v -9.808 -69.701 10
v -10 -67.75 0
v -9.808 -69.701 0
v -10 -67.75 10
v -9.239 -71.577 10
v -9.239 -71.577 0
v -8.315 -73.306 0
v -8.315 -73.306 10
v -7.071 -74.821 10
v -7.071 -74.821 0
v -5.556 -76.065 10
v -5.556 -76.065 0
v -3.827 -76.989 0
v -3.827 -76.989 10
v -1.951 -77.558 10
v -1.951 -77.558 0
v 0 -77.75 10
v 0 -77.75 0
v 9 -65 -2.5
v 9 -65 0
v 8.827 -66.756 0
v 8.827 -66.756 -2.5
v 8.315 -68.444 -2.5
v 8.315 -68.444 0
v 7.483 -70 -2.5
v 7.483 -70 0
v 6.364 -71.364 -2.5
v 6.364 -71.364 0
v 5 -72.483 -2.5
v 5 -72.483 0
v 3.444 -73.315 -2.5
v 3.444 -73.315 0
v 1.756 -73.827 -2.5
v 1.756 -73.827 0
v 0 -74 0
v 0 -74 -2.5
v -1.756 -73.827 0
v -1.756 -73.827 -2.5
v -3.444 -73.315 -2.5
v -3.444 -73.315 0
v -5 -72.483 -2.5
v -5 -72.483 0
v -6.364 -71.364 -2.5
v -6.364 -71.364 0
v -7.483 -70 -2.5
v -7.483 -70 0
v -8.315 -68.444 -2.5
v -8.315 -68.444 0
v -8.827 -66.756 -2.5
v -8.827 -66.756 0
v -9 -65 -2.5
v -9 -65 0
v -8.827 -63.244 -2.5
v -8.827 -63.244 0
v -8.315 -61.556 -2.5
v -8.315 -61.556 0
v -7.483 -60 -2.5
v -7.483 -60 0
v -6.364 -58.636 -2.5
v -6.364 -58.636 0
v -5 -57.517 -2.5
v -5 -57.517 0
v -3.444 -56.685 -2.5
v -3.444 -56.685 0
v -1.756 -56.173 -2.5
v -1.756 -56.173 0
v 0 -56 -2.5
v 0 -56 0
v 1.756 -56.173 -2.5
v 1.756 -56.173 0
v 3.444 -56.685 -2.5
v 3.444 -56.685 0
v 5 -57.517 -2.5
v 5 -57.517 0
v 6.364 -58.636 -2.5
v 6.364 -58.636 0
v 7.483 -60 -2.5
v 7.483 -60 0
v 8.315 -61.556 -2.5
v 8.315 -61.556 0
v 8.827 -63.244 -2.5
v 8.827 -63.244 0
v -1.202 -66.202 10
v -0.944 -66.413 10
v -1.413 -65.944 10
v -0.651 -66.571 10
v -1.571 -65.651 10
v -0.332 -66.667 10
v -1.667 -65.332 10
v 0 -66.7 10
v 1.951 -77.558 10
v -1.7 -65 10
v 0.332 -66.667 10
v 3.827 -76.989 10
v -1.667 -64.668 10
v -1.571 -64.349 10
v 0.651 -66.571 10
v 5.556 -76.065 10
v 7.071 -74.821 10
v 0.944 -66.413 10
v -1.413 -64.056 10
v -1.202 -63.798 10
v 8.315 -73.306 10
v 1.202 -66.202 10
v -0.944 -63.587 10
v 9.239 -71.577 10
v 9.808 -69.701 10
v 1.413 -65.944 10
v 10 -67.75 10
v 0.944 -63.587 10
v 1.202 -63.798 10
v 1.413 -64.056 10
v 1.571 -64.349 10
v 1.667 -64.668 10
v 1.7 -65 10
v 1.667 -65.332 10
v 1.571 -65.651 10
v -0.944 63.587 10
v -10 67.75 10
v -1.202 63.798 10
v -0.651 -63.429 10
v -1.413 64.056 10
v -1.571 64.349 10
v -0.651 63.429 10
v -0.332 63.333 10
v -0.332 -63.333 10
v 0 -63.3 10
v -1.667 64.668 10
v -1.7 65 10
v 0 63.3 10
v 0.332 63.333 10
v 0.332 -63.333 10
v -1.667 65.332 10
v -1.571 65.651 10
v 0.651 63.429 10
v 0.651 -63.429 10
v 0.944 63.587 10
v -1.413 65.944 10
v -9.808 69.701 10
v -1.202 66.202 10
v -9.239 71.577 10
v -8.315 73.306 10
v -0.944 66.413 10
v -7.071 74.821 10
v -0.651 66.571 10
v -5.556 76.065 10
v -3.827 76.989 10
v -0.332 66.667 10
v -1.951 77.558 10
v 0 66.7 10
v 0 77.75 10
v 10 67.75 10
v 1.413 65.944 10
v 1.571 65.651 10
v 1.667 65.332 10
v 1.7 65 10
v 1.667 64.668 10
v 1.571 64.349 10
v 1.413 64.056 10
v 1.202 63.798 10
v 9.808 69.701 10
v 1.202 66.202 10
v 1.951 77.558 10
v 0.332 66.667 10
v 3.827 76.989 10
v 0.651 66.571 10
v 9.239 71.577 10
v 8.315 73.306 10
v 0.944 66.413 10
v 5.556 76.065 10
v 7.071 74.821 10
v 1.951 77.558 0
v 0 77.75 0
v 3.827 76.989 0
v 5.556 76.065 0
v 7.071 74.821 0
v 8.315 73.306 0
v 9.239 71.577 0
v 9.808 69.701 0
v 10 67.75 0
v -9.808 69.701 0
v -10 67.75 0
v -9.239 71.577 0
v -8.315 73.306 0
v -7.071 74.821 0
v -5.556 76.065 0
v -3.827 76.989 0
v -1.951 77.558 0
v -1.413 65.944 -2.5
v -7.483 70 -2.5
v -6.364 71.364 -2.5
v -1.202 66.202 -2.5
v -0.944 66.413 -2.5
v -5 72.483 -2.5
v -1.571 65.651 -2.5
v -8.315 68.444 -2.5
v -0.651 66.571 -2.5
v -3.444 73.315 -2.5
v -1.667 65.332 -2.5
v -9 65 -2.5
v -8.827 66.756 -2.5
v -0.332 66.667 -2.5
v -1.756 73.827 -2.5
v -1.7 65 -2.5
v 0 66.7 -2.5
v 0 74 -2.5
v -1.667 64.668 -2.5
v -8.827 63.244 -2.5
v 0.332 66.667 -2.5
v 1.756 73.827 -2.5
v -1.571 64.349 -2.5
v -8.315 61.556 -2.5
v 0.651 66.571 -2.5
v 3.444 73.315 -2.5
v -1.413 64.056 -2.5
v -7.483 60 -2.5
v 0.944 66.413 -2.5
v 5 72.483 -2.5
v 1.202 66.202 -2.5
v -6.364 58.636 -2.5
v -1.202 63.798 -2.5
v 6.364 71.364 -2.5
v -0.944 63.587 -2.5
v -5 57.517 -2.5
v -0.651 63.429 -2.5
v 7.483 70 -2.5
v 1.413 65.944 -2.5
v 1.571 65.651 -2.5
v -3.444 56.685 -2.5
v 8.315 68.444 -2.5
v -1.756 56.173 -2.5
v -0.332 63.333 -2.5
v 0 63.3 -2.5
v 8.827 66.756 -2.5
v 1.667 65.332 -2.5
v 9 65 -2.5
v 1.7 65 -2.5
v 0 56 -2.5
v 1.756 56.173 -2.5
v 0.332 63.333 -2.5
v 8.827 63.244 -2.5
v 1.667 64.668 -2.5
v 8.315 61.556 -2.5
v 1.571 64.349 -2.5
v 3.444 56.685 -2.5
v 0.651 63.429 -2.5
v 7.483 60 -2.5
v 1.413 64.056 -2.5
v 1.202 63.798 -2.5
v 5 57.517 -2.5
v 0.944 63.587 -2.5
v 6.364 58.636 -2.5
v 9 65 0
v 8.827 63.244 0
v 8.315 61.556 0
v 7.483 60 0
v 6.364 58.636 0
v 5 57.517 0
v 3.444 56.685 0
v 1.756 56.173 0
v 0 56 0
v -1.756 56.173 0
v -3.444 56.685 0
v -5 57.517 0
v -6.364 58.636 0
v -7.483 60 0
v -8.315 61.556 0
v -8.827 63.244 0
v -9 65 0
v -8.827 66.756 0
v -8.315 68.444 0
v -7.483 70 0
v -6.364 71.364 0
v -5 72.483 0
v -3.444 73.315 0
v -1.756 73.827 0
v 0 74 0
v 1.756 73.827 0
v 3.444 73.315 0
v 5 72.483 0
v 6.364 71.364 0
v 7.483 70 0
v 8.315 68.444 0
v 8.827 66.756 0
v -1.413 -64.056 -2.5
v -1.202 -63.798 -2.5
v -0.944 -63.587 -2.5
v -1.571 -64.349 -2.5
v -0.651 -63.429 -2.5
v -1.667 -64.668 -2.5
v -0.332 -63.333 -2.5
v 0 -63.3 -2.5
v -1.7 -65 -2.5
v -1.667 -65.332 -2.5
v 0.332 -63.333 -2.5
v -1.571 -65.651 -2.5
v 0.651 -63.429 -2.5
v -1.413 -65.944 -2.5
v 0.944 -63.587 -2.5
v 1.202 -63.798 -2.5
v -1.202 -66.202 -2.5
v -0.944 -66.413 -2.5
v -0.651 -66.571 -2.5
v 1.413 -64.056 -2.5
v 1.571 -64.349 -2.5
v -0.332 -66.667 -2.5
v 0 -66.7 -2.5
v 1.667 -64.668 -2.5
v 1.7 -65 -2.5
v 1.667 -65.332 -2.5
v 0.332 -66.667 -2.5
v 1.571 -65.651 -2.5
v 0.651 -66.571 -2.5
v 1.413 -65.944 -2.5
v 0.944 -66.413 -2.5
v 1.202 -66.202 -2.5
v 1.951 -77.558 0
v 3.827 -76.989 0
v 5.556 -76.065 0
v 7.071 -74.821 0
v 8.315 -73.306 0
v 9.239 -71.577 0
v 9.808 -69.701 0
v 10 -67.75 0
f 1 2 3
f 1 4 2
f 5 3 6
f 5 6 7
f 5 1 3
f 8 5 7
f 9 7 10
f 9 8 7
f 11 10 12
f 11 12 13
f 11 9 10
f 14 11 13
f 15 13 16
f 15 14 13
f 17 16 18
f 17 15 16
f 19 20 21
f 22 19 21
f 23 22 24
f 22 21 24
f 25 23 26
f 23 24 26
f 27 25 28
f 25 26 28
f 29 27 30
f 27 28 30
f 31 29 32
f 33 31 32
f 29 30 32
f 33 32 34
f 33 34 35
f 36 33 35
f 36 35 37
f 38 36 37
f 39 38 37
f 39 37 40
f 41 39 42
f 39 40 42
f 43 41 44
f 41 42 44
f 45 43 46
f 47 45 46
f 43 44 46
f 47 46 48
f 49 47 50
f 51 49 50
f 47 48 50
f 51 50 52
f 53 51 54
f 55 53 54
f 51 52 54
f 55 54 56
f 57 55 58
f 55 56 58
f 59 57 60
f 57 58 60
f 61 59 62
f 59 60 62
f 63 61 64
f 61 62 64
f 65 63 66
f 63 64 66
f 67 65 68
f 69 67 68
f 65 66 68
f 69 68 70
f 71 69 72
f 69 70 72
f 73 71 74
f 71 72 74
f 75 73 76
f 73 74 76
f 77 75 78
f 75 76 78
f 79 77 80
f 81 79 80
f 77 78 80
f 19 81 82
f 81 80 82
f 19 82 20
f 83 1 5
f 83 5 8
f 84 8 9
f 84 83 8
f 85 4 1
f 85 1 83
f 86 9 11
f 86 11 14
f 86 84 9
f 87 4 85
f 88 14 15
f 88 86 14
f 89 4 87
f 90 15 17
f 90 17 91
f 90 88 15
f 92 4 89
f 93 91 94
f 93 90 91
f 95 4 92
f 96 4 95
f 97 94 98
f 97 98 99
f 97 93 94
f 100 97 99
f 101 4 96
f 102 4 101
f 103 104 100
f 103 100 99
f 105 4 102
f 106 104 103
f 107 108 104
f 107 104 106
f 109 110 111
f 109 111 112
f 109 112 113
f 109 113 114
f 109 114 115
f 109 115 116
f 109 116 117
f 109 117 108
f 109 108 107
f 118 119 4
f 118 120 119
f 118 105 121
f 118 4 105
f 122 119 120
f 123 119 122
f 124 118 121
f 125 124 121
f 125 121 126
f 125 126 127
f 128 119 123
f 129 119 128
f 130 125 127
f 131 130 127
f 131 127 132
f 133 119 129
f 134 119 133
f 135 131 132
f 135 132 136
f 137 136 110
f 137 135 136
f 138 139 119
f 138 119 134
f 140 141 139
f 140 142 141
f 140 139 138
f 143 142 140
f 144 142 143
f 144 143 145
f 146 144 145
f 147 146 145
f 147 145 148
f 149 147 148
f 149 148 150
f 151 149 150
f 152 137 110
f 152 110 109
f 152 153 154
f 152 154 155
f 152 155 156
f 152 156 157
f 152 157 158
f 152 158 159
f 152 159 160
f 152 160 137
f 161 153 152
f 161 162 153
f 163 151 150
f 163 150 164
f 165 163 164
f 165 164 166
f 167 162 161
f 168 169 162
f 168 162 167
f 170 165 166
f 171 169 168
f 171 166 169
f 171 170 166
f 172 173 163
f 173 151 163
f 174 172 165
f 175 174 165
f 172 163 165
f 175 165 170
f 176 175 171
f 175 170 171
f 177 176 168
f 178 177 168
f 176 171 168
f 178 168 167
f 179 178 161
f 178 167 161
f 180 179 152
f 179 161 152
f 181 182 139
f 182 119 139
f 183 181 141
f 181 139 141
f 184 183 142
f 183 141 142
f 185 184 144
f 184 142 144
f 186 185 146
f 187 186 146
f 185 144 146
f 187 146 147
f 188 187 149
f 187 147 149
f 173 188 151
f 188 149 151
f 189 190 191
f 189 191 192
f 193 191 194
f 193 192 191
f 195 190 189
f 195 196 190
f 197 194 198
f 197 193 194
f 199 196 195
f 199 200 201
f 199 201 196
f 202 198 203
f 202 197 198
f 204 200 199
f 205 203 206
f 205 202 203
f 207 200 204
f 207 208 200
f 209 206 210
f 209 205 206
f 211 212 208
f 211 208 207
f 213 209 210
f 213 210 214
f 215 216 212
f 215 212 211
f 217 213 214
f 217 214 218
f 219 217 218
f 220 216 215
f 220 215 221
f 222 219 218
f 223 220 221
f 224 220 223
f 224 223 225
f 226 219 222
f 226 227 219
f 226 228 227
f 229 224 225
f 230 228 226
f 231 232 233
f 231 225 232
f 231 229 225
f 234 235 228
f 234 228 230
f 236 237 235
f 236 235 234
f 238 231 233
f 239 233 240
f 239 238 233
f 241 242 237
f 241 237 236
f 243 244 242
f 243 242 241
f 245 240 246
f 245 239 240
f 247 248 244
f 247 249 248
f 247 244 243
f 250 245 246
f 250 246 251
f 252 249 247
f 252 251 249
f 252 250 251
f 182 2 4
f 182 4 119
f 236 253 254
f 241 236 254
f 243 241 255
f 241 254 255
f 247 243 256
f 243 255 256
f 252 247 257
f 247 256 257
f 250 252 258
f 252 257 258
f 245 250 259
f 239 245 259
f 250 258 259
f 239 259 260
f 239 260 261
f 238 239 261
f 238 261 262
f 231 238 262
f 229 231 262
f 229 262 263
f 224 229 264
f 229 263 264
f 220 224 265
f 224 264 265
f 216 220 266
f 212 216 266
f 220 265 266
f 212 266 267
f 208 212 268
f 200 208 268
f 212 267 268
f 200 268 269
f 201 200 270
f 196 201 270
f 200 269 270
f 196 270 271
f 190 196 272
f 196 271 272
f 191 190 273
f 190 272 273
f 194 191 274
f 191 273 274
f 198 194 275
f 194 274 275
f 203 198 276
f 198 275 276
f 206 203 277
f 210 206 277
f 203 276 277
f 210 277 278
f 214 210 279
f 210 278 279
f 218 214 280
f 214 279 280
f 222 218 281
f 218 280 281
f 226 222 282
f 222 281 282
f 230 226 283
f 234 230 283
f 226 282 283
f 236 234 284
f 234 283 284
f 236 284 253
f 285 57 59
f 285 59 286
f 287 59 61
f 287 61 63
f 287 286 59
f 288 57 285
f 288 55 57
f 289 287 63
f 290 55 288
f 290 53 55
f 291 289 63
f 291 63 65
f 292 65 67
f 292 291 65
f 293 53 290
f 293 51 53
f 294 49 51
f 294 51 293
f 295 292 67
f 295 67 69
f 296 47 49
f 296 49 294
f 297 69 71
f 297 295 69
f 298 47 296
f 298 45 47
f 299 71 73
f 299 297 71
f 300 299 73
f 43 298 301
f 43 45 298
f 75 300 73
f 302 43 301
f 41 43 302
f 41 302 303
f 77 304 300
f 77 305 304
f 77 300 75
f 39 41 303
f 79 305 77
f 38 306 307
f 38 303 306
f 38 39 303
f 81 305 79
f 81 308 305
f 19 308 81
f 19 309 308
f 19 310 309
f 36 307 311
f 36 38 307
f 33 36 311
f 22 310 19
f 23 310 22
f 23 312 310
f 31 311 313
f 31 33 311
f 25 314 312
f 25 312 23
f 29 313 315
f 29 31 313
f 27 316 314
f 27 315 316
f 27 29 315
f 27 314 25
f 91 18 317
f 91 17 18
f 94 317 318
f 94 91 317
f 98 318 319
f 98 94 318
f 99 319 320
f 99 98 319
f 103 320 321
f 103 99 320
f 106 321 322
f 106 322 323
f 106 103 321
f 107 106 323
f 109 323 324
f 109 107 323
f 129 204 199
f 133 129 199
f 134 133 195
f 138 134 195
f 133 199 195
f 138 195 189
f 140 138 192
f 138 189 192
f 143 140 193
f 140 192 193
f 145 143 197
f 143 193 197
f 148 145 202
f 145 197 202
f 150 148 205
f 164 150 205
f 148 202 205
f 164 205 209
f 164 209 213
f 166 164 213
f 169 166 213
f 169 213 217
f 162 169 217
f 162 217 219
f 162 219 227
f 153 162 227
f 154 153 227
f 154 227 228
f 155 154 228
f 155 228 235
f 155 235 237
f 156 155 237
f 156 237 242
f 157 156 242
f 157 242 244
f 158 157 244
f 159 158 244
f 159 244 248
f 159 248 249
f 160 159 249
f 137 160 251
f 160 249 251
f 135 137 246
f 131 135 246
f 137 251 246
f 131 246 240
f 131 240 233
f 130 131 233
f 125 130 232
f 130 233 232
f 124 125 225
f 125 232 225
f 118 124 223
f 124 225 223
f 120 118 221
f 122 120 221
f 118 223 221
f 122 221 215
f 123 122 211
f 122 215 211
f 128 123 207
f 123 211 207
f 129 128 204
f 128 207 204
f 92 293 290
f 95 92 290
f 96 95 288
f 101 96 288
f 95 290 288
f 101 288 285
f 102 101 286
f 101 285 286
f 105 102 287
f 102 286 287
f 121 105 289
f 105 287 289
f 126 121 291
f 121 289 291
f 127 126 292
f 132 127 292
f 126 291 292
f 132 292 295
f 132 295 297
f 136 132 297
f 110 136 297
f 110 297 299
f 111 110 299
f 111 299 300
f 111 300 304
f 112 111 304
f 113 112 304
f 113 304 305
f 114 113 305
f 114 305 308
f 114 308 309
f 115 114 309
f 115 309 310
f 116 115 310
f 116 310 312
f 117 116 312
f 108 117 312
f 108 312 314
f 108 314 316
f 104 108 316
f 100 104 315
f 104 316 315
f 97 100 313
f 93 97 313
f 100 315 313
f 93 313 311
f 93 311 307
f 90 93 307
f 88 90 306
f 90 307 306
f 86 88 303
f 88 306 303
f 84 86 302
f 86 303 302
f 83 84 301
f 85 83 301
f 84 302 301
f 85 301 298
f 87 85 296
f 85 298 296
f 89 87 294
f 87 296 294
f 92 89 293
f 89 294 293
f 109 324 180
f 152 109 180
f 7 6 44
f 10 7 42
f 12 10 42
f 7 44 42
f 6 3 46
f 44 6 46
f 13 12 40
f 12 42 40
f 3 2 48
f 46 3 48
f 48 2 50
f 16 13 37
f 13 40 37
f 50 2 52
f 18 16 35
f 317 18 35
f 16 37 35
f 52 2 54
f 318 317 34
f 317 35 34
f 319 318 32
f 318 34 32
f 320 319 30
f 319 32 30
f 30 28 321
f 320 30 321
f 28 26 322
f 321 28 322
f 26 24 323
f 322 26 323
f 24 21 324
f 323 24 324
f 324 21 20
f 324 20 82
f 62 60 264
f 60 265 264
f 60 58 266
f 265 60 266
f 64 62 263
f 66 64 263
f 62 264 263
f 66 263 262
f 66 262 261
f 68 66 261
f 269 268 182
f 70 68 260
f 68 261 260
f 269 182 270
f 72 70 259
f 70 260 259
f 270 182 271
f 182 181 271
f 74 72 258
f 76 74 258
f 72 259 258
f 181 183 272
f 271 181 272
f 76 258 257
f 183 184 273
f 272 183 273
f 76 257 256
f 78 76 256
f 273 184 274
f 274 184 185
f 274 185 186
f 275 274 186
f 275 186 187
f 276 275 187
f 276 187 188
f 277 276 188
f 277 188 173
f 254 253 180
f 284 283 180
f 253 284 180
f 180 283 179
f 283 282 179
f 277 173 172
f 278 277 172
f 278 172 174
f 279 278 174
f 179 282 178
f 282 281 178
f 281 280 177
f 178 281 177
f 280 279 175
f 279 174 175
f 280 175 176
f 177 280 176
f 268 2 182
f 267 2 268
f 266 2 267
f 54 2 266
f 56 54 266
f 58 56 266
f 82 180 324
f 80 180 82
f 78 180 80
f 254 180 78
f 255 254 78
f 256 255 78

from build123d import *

# Parameters (mm, degrees)
SKETCH1_W           = 20
SKETCH1_H           = 155.5
BOSS_EXTRUDE1_DEPTH = 10
SKETCH2_R           = 9
BOSS_EXTRUDE2_DEPTH = 2.5
SKETCH3_R           = 1.7
CUT_EXTRUDE1_DEPTH  = 80.380806874
FILLET1_R           = 10


with BuildPart() as part:
    # Sketch1 → Boss-Extrude1 (new body)
    with BuildSketch(Plane.XY):
        Rectangle(SKETCH1_W, SKETCH1_H)
    extrude(amount=BOSS_EXTRUDE1_DEPTH)

    # Sketch2 → Boss-Extrude2 (add)
    with BuildSketch(Plane(origin=(0, 0, 0), x_dir=(-1, 0, 0), z_dir=(0, 0, -1))):
        with Locations(Location((0, 65, 0), (0, 0, 180))):
            Circle(SKETCH2_R)
        with Locations(Location((0, -65, 0), (0, 0, 180))):
            Circle(SKETCH2_R)
    extrude(amount=BOSS_EXTRUDE2_DEPTH)

    # Sketch3 → Cut-Extrude1 (cut, through all)
    with BuildSketch(Plane(origin=(0, 0, -2.5), x_dir=(-1, 0, 0), z_dir=(0, 0, -1))):
        with Locations((0, 65)):
            Circle(SKETCH3_R)
        with Locations((0, -65)):
            Circle(SKETCH3_R)
    extrude(amount=-CUT_EXTRUDE1_DEPTH, mode=Mode.SUBTRACT)

    # Fillet1
    fillet1_edges = [part.edges().sort_by_distance(p)[0] for p in [
        (10, -77.75, 5),
        (-10, -77.75, 5),
        (-10, 77.75, 5),
        (10, 77.75, 5),
    ]]
    fillet(fillet1_edges, radius=FILLET1_R - 0.0001)  # a hair under: the kernel refuses the full size


solid = part.part
